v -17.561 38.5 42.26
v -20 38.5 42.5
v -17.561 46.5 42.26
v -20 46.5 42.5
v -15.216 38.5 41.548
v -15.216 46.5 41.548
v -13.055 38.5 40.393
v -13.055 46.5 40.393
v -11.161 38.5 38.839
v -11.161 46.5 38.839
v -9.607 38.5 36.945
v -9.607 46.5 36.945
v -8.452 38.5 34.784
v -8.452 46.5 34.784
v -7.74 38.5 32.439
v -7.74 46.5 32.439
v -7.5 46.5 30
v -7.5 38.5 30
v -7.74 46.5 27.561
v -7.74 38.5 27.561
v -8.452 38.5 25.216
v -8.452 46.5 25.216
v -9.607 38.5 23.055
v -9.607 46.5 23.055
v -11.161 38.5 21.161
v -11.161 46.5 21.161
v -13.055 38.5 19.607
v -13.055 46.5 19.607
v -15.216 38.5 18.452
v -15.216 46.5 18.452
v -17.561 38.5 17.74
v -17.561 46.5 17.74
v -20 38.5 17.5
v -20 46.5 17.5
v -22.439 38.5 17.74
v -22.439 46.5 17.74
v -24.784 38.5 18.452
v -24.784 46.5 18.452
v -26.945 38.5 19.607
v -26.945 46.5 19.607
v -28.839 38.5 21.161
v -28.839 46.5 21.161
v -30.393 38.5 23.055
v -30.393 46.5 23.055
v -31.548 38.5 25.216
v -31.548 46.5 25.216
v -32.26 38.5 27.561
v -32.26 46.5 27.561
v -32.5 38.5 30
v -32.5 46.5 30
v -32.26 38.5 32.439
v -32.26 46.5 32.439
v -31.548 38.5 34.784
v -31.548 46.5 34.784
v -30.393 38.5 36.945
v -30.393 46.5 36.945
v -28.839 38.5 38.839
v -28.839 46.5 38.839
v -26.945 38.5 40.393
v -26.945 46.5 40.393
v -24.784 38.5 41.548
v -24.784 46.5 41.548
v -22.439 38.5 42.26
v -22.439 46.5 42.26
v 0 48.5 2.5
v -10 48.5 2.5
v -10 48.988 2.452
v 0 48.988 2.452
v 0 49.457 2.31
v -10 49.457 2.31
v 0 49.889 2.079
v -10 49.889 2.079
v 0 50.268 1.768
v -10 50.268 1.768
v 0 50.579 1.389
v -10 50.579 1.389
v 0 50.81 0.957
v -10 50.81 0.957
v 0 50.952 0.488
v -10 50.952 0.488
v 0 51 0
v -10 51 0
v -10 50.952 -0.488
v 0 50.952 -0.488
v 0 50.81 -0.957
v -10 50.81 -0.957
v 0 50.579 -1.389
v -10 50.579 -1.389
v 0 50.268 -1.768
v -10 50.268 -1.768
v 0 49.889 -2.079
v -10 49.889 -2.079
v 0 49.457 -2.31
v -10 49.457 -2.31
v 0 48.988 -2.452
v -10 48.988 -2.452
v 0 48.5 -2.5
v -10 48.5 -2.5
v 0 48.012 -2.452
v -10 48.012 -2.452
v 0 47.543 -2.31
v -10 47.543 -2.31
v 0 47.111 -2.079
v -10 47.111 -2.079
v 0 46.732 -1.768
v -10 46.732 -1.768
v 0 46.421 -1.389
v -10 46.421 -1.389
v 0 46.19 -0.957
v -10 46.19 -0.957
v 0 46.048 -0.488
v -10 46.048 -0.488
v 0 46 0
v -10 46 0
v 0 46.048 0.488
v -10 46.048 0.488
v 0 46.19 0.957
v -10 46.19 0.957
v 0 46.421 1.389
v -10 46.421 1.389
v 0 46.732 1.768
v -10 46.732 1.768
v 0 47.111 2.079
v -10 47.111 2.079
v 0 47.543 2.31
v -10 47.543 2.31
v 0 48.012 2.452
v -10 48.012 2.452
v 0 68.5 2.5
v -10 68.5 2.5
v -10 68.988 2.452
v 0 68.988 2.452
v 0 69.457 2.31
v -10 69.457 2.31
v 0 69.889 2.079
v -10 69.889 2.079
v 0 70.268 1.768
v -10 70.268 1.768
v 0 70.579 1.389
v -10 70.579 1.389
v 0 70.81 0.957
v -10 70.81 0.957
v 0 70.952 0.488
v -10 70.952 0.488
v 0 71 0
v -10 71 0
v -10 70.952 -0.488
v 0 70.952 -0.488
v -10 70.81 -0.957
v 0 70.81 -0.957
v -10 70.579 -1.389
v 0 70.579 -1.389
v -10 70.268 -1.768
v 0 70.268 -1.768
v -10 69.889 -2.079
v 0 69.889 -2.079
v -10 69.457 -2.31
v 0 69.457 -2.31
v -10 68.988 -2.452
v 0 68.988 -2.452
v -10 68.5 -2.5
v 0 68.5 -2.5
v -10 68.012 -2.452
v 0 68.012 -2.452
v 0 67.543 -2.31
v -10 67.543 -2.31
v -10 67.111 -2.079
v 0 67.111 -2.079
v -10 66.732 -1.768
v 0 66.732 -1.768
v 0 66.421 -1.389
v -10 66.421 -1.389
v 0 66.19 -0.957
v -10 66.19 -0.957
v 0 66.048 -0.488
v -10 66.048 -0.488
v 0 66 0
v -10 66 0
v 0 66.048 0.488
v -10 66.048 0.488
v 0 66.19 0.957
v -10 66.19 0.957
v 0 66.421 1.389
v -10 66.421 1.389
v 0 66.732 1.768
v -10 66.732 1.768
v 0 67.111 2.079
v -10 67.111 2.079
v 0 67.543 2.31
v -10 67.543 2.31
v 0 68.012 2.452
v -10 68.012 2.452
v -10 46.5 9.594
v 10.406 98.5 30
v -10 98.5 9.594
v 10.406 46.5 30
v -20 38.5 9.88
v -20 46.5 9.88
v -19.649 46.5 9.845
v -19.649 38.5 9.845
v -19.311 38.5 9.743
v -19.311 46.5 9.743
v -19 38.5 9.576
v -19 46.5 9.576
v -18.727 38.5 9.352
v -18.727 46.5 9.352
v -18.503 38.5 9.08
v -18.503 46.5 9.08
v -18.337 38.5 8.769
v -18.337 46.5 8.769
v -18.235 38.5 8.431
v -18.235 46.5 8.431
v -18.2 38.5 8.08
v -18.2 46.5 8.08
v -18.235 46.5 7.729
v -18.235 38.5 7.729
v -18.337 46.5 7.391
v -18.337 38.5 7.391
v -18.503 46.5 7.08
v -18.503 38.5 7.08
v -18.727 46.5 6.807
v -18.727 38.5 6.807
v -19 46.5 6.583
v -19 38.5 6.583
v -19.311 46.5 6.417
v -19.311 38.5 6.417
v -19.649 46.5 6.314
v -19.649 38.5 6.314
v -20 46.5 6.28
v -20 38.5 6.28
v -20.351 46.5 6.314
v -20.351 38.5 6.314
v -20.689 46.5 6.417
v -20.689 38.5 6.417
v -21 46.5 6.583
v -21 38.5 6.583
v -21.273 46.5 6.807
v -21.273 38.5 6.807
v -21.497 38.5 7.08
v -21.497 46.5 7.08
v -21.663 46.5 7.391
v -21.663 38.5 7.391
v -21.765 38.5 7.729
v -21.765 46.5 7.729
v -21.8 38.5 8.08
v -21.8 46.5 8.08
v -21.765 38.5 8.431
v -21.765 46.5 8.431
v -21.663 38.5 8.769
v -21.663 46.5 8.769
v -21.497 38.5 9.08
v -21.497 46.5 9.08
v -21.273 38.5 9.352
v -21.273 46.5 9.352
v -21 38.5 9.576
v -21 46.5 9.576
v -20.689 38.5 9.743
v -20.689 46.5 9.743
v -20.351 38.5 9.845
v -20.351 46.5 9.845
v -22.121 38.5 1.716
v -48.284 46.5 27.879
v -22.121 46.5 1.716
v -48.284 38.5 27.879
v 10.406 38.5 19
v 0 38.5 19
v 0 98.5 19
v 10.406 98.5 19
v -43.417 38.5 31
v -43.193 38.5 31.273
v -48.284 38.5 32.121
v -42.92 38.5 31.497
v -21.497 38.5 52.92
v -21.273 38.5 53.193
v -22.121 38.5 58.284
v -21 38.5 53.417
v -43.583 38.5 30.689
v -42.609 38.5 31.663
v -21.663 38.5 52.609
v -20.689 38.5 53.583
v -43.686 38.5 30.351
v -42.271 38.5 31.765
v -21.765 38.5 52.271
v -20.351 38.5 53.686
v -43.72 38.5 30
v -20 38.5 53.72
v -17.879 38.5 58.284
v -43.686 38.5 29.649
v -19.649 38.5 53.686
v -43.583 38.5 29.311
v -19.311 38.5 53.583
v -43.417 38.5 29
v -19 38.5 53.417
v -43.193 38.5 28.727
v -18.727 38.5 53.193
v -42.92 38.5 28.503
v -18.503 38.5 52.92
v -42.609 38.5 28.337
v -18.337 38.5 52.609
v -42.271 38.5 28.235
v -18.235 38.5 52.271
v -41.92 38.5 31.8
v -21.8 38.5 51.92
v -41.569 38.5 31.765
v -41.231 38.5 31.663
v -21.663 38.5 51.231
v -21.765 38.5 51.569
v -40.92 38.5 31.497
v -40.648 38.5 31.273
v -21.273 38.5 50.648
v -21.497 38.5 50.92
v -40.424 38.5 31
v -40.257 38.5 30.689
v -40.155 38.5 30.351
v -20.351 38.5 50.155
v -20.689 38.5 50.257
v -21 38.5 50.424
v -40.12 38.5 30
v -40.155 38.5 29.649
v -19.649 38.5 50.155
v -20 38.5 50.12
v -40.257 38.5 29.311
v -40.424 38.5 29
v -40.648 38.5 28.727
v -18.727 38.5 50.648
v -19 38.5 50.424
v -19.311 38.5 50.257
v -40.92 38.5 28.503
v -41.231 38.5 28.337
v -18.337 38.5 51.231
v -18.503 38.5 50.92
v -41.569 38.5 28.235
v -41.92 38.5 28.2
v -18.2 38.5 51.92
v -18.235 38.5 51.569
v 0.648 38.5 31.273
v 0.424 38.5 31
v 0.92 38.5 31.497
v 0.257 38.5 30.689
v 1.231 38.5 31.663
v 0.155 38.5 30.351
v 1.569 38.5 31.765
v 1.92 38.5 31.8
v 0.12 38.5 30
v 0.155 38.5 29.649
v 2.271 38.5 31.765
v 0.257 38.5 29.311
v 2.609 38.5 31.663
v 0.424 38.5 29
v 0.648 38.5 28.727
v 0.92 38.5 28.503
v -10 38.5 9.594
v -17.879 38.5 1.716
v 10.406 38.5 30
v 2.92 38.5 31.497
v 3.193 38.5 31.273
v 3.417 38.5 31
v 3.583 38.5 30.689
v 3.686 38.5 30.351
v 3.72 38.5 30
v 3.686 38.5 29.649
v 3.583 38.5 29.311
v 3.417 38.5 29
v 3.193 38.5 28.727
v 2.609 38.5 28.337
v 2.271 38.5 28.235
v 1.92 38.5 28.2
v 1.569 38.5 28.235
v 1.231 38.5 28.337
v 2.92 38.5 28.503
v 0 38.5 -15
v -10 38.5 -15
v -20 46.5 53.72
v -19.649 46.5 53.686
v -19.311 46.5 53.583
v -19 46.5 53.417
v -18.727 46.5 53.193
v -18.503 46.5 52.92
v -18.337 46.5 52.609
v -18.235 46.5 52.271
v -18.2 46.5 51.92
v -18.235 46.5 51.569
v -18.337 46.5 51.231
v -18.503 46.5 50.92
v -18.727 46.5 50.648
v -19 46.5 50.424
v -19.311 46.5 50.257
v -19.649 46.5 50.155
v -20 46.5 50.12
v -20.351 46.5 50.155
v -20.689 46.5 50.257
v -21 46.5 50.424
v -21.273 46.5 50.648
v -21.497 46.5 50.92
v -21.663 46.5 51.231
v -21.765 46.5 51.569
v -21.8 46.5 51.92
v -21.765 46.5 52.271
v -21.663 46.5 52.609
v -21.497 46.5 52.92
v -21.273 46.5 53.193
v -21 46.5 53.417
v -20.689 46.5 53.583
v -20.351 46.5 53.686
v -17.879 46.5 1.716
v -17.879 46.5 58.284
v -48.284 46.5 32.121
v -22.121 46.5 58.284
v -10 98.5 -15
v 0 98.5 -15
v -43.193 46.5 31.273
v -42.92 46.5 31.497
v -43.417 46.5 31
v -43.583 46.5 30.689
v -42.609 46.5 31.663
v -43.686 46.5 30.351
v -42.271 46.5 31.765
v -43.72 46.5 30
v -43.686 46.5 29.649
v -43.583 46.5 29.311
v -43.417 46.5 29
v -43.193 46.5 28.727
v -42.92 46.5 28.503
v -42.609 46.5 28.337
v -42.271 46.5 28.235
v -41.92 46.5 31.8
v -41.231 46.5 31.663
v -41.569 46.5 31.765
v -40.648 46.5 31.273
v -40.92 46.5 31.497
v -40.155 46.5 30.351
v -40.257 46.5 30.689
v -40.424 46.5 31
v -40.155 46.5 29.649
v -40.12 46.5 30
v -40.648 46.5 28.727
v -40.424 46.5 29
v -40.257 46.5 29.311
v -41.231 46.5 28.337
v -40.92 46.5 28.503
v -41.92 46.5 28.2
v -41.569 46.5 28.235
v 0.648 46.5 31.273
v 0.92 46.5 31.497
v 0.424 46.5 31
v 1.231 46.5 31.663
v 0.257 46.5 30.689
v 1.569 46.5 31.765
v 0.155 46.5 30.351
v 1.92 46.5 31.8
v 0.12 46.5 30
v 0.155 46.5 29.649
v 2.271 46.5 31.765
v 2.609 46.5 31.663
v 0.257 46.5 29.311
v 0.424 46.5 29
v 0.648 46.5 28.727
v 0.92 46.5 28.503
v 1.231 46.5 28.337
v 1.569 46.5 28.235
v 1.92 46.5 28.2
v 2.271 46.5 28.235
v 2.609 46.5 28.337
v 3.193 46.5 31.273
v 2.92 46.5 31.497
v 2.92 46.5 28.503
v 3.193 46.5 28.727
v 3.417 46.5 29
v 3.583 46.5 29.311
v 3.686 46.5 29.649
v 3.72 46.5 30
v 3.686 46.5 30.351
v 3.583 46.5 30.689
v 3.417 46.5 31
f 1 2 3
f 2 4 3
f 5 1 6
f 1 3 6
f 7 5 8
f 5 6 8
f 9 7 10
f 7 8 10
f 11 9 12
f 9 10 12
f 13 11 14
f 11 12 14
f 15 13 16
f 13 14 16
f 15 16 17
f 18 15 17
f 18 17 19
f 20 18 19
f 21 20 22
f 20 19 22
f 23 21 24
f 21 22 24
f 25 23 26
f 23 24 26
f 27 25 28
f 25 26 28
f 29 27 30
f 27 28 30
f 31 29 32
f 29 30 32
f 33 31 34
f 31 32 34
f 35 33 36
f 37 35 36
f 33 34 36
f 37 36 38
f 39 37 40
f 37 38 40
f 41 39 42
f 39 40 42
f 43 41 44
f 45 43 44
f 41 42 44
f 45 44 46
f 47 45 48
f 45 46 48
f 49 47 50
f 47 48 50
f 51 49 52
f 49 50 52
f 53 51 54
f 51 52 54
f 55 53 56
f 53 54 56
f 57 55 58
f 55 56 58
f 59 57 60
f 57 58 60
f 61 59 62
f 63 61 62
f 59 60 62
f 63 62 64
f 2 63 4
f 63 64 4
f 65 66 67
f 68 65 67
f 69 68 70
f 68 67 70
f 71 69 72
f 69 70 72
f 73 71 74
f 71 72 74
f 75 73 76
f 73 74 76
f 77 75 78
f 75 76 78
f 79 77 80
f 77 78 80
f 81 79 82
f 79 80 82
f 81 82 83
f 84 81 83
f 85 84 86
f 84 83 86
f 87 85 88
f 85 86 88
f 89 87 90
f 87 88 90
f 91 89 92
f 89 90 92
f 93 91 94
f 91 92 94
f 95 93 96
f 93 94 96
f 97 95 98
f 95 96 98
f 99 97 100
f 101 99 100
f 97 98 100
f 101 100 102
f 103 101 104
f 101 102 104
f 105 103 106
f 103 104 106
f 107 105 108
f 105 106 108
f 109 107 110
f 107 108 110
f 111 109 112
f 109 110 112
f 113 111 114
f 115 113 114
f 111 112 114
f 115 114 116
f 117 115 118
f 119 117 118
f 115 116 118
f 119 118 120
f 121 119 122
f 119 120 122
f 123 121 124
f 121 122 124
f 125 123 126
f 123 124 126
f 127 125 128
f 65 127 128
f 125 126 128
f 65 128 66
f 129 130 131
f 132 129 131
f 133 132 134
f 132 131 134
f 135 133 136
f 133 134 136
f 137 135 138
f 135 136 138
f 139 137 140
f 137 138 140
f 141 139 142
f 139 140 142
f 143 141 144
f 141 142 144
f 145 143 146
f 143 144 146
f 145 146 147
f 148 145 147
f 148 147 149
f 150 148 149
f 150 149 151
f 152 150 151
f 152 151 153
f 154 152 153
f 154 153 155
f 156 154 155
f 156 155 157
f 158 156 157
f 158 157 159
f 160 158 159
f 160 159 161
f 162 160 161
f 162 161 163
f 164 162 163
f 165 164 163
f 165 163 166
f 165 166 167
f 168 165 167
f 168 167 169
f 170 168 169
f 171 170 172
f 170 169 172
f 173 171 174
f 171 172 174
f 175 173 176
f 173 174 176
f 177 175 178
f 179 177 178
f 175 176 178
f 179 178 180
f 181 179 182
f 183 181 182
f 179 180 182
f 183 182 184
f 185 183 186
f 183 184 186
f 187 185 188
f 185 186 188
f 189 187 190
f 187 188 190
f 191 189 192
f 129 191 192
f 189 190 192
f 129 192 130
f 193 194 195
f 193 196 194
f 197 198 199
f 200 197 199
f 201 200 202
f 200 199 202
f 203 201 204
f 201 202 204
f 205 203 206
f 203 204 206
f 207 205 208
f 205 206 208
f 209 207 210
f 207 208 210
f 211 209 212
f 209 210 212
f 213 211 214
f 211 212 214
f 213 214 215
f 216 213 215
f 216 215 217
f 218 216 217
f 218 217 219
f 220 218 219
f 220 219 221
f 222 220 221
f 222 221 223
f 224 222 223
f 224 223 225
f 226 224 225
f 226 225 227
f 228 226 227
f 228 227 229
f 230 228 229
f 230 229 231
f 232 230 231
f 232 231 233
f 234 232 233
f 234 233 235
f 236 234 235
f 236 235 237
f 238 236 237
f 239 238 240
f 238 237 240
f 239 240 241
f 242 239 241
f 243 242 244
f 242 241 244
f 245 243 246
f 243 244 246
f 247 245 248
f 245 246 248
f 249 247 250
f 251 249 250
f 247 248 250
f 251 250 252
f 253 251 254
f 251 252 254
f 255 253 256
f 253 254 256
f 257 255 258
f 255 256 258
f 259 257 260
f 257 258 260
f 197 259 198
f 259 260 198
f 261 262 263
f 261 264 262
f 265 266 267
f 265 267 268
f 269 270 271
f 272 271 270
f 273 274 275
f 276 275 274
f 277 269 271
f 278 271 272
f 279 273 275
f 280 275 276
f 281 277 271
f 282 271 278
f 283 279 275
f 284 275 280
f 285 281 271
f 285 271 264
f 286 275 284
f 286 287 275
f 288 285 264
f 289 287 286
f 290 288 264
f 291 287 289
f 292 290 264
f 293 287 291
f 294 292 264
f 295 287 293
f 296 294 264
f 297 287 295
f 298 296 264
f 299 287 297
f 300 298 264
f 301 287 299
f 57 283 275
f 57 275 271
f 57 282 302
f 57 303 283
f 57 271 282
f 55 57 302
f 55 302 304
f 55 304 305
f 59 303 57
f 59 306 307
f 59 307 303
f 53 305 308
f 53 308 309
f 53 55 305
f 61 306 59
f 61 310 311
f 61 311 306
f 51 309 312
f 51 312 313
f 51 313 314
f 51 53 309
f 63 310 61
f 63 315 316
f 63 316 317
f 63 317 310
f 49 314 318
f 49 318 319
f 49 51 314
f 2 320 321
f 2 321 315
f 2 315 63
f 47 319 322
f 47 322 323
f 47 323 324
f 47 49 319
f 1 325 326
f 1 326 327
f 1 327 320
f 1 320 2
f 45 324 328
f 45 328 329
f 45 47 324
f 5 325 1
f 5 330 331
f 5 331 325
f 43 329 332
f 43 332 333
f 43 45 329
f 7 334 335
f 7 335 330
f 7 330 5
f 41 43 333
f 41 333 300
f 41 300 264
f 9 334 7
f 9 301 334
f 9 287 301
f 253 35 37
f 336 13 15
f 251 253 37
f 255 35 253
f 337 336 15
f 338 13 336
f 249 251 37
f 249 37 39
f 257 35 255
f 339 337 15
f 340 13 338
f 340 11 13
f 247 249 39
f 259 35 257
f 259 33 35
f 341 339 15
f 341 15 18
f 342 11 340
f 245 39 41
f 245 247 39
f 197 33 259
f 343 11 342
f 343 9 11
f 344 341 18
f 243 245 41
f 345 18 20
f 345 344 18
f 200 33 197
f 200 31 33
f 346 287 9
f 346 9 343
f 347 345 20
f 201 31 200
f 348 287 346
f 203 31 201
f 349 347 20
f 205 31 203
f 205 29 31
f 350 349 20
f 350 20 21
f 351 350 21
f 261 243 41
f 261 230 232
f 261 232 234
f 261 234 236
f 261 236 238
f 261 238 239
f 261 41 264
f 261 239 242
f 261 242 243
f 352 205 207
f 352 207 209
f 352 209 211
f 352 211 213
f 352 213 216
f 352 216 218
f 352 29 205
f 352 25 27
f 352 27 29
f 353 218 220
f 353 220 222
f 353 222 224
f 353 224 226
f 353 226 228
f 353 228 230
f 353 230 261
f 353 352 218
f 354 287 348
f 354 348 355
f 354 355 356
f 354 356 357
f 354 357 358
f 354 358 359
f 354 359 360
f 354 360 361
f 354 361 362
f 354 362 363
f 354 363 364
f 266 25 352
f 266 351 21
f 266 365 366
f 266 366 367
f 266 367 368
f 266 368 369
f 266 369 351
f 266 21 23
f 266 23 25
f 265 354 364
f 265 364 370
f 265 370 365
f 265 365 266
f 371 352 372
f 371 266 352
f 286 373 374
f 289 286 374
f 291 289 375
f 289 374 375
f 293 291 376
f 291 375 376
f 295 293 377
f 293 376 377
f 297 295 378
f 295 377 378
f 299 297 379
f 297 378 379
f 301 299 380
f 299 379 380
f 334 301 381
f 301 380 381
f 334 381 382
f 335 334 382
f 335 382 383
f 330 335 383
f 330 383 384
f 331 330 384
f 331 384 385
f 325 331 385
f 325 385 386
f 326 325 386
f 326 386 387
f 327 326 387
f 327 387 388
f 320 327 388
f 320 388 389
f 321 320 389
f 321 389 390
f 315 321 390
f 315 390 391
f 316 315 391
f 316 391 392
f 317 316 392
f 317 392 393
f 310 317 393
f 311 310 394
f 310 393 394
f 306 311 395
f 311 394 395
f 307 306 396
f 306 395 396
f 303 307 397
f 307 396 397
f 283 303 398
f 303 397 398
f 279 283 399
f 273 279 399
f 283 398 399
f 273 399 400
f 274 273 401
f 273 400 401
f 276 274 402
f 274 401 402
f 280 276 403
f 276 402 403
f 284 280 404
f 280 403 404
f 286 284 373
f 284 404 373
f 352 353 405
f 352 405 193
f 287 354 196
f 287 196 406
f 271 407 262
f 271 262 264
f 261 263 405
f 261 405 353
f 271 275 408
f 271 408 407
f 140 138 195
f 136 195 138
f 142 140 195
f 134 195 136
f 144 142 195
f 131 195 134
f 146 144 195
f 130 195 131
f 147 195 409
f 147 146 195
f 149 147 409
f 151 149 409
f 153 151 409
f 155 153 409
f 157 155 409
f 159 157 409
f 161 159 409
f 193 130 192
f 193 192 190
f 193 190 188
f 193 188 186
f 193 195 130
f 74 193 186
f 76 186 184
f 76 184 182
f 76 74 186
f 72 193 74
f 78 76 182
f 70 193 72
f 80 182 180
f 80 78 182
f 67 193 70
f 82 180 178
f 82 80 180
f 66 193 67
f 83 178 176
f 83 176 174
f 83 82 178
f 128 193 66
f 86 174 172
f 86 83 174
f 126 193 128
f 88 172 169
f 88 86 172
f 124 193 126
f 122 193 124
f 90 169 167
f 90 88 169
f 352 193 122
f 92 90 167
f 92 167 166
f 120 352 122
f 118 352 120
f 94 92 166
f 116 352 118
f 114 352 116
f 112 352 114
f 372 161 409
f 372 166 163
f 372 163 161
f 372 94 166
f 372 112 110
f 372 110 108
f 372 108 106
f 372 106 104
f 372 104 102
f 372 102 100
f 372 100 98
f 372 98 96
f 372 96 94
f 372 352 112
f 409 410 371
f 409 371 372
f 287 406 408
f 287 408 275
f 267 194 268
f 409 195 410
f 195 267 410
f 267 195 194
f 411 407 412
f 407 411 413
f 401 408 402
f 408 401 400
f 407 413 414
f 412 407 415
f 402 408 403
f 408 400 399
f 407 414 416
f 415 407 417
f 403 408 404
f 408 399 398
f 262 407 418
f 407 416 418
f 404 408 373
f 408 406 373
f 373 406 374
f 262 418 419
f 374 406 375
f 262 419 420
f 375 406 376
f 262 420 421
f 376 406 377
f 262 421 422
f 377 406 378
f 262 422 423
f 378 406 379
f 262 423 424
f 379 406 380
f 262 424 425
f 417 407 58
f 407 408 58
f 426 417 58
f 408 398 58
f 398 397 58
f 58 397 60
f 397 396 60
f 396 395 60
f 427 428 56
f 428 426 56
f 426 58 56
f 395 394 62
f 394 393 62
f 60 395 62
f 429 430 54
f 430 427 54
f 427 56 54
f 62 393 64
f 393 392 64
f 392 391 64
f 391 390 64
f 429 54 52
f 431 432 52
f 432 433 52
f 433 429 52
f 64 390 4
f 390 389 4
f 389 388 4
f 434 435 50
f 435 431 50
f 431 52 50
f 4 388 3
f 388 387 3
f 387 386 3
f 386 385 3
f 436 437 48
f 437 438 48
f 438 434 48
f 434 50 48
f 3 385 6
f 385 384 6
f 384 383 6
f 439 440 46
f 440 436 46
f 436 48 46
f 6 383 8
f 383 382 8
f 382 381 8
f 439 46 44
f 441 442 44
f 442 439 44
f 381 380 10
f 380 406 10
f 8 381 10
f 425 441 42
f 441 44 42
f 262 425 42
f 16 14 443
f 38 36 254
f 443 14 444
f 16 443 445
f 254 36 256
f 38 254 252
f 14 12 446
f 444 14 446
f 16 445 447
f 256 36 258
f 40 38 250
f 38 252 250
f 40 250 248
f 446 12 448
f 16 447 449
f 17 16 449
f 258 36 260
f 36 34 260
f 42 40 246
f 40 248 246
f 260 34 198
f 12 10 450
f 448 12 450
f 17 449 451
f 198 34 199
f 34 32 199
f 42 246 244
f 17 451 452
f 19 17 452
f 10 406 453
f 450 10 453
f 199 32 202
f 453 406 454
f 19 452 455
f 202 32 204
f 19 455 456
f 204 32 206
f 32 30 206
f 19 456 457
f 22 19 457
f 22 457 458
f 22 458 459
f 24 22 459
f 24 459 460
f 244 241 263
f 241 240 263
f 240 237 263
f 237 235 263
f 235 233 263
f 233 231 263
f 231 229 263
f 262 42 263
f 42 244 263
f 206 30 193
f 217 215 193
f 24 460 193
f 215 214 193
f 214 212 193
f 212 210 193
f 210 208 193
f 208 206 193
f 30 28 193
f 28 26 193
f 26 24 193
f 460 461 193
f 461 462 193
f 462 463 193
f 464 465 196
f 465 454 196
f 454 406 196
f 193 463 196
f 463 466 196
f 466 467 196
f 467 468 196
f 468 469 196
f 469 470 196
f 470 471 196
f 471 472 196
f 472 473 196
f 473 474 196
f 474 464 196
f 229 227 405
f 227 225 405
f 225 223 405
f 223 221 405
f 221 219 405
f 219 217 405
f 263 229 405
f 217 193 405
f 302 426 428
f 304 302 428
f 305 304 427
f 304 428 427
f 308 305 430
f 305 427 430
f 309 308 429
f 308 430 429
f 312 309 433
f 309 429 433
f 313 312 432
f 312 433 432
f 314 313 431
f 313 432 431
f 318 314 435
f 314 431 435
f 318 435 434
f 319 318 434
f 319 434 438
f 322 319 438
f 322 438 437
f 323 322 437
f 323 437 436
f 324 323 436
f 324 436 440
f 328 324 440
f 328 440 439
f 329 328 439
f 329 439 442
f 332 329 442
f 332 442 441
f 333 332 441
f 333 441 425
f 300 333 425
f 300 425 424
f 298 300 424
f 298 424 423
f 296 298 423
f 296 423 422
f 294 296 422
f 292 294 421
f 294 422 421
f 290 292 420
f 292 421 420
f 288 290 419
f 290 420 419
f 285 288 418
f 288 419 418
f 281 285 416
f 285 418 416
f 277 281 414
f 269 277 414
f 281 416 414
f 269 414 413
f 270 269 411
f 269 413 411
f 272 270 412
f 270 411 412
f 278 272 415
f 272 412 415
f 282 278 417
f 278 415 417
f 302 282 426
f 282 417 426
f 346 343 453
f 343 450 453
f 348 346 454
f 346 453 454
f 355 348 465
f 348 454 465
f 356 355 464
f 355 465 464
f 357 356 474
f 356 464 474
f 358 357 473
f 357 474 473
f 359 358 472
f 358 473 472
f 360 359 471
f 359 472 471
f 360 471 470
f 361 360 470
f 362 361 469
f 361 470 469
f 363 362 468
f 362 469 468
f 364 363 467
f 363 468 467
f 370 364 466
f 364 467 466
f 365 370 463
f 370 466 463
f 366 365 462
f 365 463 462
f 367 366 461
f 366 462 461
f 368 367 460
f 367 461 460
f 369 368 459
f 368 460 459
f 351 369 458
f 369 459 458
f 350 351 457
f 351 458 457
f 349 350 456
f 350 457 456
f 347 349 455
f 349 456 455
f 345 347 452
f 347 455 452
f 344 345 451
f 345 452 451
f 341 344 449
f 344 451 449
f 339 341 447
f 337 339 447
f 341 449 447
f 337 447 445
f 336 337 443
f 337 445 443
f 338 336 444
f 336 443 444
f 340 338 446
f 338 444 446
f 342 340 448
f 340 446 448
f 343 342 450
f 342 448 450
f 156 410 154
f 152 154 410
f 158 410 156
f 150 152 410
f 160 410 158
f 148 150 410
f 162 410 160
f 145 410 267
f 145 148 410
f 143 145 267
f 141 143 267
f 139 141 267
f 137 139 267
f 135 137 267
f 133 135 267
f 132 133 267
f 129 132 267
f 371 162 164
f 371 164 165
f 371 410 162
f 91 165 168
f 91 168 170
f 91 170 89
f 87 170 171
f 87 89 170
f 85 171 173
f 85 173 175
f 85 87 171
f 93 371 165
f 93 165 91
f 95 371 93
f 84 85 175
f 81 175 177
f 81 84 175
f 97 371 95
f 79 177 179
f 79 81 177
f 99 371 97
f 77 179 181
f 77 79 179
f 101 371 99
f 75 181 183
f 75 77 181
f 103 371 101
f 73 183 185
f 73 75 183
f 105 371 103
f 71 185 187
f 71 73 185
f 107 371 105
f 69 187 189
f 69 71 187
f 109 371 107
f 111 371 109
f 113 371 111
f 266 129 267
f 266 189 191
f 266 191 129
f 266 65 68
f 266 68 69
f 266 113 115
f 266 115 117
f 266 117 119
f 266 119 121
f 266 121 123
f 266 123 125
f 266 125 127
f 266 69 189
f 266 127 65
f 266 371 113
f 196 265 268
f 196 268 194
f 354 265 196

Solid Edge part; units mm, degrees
sketch "Sketch1" plane through (0, 38.5, 0) normal (0, -1, 0) x (1, 0, 0)
  line L0 (-20, -0.4056) -> (10.4056, 30)
  line L1 (10.4056, 30) -> (-20, 60.4056)
  line L2 (-20, 60.4056) -> (-50.4056, 30)
  line L3 (-50.4056, 30) -> (-20, -0.4056)
  dimension "D1" = 43
extrude "ExtrudedProtrusion_1" add sketch "Sketch1" against normal blind 8
sketch "Sketch2" plane through (0, 38.5, 0) normal (0, -1, 0) x (1, 0, 0)
  line L0 (0, 0) -> (0, 19.5944)
  line L1 (0, 19.5944) -> (-10, 9.5944)
  line L2 (-10, 9.5944) -> (-10, 0)
  line L3 (-10, 0) -> (0, 0)
  dimension "D1" = 10
extrude "ExtrudedProtrusion_2" add sketch "Sketch2" against normal blind 60
sketch "Sketch3" plane through (0, 38.5, 0) normal (0, -1, 0) x (1, 0, 0)
  line L0 (0, 19) -> (10.4056, 19)
  line L1 (10.4056, 19) -> (10.4056, 30)
  line L2 (10.4056, 30) -> (0, 19.5944)
  line L3 (0, 19.5944) -> (0, 19)
extrude "ExtrudedProtrusion_3" add sketch "Sketch3" against normal blind 60
hole "Hole_1" at (-20, 46.5, 30) direction (0, -1, 0) diameter 25 end up to next
hole "Hole_2" at (1.9203, 46.5, 30) direction (0, -1, 0) diameter 3.6 end up to next
hole "Hole1" at (-20, 46.5, 51.9203) direction (0, -1, 0) diameter 3.6 end up to next
hole "Hole2" at (-41.9203, 46.5, 30) direction (0, -1, 0) diameter 3.6 end up to next
hole "Hole3" at (-20, 46.5, 8.0797) direction (0, -1, 0) diameter 3.6 end up to next
chamfer "Chamfer_1" distance 3 angle 45 3 edges at (-20, 42.5, 60.4056) (-50.4056, 42.5, 30) (-20, 42.5, -0.4056)
sketch "Sketch4" plane through (-5, 68.5, 0) normal (0, 0, -1) x (0, -1, 0)
  line L0 (-30, 5) -> (-30, -5)
  line L1 (30, -5) -> (-30, -5)
  line L2 (30, 5) -> (30, -5)
  line L3 (-30, 5) -> (30, 5)
extrude "ExtrudedProtrusion_5" add sketch "Sketch4" along normal blind 15
hole "Hole_6" at (-10, 48.5, 0) direction (1, 0, 0) diameter 5 end up to next
hole "Hole4" at (-10, 68.5, 0) direction (1, 0, 0) diameter 5 end up to next
properties material "Polyethylene, low density"
